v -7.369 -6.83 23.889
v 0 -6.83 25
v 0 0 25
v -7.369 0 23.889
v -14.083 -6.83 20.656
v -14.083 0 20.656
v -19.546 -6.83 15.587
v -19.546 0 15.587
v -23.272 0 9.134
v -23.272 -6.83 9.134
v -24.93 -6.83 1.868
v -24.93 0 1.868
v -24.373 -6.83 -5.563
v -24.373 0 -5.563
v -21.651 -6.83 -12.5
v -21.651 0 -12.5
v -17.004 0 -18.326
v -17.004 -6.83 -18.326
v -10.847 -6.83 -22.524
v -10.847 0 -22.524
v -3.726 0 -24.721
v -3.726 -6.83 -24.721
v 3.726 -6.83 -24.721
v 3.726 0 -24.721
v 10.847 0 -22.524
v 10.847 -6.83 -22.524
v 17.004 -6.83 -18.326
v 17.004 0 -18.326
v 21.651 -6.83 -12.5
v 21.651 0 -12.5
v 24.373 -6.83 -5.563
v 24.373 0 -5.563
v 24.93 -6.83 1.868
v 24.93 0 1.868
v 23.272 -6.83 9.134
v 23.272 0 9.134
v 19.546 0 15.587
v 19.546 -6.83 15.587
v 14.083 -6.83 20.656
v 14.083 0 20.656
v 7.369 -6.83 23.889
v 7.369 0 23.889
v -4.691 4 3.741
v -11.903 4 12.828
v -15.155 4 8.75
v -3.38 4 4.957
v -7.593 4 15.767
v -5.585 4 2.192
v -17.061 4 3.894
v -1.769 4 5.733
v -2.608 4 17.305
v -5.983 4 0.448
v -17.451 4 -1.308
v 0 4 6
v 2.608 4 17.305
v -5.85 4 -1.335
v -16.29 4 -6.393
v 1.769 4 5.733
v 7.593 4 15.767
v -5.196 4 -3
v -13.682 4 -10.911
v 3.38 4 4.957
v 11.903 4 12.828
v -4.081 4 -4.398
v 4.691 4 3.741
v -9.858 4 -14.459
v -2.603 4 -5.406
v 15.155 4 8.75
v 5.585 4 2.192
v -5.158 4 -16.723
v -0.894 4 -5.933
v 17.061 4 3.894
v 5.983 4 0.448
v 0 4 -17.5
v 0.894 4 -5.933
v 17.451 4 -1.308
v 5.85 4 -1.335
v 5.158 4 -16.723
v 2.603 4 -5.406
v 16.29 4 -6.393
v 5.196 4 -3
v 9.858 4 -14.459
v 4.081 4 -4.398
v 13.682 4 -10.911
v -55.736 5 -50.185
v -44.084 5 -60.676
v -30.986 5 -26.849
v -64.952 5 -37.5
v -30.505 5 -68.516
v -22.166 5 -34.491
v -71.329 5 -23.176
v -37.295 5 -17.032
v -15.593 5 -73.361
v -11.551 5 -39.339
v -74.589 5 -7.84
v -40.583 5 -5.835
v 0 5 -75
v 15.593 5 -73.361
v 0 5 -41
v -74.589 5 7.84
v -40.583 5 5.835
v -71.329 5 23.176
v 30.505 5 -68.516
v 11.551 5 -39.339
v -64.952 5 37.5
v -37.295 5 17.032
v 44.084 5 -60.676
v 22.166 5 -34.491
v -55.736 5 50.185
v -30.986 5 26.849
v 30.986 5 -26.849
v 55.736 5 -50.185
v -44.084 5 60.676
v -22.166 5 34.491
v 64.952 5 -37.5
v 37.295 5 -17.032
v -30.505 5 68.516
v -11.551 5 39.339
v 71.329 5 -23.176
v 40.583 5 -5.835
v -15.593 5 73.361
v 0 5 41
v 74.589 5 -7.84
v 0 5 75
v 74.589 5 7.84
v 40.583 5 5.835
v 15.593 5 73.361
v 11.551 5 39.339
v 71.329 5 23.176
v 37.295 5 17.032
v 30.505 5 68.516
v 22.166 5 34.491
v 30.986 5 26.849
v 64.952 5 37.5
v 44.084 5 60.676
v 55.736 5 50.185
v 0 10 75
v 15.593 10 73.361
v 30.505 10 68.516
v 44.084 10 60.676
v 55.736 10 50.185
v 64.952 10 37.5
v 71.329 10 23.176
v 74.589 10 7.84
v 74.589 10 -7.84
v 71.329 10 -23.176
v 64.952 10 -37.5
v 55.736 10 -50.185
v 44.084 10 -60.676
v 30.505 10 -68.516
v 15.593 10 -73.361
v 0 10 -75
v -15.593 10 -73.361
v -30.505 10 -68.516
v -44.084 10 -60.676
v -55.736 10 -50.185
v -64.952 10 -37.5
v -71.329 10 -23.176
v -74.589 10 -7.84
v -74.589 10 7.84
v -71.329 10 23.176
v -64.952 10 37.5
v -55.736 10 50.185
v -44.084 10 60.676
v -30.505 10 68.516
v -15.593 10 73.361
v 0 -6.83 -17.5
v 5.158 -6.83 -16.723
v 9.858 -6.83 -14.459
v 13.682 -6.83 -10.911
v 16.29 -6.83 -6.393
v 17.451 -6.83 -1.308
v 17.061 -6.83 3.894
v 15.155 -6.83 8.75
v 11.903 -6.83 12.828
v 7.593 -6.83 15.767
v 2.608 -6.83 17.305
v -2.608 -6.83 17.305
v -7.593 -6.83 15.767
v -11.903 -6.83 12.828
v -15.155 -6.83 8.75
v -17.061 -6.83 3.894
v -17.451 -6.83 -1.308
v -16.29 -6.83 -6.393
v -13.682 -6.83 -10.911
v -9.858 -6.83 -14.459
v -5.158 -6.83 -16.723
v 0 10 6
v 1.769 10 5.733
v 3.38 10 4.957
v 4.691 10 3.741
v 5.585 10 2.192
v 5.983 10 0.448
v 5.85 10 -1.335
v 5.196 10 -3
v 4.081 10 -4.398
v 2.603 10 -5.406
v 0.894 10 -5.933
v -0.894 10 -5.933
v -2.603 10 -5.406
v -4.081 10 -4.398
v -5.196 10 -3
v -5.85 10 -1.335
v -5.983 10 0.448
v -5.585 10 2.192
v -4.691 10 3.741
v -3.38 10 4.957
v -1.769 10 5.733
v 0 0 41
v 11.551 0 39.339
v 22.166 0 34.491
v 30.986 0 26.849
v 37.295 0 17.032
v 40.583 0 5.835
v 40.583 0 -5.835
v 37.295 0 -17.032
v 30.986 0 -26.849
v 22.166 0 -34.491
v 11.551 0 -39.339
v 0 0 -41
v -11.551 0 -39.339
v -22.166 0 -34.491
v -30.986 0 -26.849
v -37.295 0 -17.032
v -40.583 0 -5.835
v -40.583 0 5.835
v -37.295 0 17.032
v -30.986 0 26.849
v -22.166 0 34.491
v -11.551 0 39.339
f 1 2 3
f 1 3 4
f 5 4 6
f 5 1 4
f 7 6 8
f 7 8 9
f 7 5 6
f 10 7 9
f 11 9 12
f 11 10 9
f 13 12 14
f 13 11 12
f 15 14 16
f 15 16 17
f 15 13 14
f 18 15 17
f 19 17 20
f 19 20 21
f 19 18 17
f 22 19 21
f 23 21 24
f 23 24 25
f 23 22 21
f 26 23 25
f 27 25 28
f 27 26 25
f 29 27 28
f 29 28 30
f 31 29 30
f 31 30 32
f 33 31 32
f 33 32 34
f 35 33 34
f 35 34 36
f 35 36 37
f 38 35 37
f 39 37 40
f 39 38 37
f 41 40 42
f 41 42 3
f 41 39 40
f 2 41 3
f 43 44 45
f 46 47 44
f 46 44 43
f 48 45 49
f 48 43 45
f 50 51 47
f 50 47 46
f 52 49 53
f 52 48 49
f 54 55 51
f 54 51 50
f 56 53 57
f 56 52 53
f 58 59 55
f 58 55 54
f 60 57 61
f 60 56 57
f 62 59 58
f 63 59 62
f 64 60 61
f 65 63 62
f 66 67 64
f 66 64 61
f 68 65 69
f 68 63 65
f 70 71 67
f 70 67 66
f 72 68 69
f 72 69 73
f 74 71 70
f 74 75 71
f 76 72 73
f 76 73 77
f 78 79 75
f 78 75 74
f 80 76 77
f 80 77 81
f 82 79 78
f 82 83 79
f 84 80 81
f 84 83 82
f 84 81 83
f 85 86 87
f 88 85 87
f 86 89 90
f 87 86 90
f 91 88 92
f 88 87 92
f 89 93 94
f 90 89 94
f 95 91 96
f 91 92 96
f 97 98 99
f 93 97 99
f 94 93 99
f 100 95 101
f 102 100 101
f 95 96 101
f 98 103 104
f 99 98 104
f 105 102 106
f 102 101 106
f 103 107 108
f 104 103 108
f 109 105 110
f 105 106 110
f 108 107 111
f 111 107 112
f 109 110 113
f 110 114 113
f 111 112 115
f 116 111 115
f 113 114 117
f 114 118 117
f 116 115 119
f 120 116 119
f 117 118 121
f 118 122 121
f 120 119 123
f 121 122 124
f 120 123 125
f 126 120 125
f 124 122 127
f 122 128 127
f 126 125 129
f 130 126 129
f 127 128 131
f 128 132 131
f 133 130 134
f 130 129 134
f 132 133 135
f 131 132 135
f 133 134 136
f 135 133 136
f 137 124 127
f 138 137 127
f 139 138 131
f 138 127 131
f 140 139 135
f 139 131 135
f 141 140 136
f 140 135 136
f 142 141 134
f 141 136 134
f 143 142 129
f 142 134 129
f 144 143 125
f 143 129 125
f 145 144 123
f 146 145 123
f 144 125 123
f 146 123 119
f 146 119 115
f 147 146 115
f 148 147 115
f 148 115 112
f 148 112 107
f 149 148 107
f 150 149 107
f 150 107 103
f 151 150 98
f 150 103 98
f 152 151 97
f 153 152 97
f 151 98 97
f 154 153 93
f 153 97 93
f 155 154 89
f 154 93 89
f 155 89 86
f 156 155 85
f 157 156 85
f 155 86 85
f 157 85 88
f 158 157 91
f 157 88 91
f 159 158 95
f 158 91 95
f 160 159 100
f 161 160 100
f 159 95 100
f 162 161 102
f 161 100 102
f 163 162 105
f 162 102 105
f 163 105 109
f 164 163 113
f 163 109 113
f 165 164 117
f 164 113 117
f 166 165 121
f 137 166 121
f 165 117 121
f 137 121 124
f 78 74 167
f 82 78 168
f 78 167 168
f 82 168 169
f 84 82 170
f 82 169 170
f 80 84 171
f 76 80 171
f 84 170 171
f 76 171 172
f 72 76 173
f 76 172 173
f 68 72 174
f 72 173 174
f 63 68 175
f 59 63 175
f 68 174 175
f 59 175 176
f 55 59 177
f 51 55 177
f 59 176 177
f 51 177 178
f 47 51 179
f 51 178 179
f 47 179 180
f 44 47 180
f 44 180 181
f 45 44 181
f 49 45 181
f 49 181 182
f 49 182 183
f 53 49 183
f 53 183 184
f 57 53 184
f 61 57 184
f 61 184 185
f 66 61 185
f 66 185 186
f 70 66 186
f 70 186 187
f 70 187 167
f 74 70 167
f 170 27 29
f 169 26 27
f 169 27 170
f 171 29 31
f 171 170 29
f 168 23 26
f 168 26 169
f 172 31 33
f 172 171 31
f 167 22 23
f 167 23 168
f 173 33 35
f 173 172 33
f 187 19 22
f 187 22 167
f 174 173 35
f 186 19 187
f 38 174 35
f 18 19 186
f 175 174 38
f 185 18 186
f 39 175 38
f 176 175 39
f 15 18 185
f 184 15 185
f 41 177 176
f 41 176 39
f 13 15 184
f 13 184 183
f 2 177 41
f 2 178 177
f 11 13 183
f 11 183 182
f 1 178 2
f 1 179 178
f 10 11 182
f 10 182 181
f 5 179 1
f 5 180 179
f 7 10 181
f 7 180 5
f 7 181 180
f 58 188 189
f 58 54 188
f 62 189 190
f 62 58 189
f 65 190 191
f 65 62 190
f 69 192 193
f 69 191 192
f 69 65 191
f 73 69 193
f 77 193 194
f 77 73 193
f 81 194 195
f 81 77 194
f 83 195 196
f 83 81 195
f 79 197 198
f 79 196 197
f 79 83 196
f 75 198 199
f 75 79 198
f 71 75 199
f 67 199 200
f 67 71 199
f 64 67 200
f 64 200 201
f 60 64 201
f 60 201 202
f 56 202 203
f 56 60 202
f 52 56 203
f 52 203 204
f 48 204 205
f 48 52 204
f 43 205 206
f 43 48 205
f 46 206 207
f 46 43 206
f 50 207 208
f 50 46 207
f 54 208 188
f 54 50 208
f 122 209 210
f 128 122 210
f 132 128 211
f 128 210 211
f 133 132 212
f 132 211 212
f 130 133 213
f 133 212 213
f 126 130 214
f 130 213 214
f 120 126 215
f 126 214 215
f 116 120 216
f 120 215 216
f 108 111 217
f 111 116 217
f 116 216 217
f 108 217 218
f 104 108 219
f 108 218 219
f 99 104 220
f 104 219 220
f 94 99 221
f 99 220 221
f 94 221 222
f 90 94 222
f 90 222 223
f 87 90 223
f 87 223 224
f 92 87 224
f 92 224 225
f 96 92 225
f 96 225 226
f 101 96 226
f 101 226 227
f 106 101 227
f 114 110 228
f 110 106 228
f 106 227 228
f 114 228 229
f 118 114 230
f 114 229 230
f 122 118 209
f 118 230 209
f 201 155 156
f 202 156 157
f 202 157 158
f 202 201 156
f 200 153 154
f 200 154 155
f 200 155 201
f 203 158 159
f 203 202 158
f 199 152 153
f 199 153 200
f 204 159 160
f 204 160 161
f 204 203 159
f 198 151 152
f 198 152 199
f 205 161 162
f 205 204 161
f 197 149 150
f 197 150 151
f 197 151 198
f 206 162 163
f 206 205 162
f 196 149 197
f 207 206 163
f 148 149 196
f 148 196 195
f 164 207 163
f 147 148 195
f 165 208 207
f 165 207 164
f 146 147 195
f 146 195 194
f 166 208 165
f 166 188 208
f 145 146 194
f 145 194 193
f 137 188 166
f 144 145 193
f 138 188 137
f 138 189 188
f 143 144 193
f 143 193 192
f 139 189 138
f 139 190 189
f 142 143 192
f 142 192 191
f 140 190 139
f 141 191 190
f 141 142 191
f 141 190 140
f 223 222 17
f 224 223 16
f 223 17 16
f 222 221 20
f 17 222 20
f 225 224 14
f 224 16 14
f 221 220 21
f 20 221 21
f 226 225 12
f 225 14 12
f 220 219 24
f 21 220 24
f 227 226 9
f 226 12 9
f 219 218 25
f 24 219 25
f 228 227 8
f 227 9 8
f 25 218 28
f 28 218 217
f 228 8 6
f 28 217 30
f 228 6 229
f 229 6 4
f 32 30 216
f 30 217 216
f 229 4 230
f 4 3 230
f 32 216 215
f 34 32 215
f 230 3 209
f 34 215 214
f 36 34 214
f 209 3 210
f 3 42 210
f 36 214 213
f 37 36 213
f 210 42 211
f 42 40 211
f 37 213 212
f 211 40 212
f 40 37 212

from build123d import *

# Parameters (mm, degrees)
ESQUISSE1_R             = 41
ESQUISSE1_R_2           = 6
BOSS_EXTRU_1_DEPTH      = 10
ESQUISSE2_R             = 17.5
ENL_V_MAT_EXTRU_1_DEPTH = 4
BOSS_EXTRU_2_START      = -5
ESQUISSE3_R             = 75
ESQUISSE3_R_2           = 6
BOSS_EXTRU_2_DEPTH      = 5
BOSS_EXTRU_3_START      = 6.83
ESQUISSE4_R             = 25
ESQUISSE4_R_2           = 17.5
BOSS_EXTRU_3_DEPTH      = 6.83


with BuildPart() as part:
    # Esquisse1 → Boss.-Extru.1 (new body)
    with BuildSketch(Plane(origin=(0, 0, 0), x_dir=(1, 0, 0), z_dir=(0, 1, 0))):
        with Locations(Location((0, 0, 0), (0, 0, 270))):
            Circle(ESQUISSE1_R)
        with Locations(Location((0, 0, 0), (0, 0, 270))):
            Circle(ESQUISSE1_R_2, mode=Mode.SUBTRACT)
    extrude(amount=BOSS_EXTRU_1_DEPTH)

    # Esquisse2 → Enlèv. mat.-Extru.1 (cut)
    with BuildSketch(Plane.XZ):
        with Locations(Location((0, 0, 0), (0, 0, 270))):
            Circle(ESQUISSE2_R)
    extrude(amount=-ENL_V_MAT_EXTRU_1_DEPTH, mode=Mode.SUBTRACT)

    # Esquisse3 → Boss.-Extru.2 (add)
    with BuildSketch(Plane(origin=(0, 10, 0), x_dir=(1, 0, 0), z_dir=(0, 1, 0)).offset(BOSS_EXTRU_2_START)):
        with Locations(Location((0, 0, 0), (0, 0, 270))):
            Circle(ESQUISSE3_R)
        with Locations(Location((0, 0, 0), (0, 0, 90))):
            Circle(ESQUISSE3_R_2, mode=Mode.SUBTRACT)
    extrude(amount=BOSS_EXTRU_2_DEPTH)

    # Esquisse4 → Boss.-Extru.3 (add)
    with BuildSketch(Plane.XZ.offset(BOSS_EXTRU_3_START)):
        with Locations(Location((0, 0, 0), (0, 0, 90))):
            Circle(ESQUISSE4_R)
        with Locations(Location((0, 0, 0), (0, 0, 270))):
            Circle(ESQUISSE4_R_2, mode=Mode.SUBTRACT)
    extrude(amount=-BOSS_EXTRU_3_DEPTH)


solid = part.part
